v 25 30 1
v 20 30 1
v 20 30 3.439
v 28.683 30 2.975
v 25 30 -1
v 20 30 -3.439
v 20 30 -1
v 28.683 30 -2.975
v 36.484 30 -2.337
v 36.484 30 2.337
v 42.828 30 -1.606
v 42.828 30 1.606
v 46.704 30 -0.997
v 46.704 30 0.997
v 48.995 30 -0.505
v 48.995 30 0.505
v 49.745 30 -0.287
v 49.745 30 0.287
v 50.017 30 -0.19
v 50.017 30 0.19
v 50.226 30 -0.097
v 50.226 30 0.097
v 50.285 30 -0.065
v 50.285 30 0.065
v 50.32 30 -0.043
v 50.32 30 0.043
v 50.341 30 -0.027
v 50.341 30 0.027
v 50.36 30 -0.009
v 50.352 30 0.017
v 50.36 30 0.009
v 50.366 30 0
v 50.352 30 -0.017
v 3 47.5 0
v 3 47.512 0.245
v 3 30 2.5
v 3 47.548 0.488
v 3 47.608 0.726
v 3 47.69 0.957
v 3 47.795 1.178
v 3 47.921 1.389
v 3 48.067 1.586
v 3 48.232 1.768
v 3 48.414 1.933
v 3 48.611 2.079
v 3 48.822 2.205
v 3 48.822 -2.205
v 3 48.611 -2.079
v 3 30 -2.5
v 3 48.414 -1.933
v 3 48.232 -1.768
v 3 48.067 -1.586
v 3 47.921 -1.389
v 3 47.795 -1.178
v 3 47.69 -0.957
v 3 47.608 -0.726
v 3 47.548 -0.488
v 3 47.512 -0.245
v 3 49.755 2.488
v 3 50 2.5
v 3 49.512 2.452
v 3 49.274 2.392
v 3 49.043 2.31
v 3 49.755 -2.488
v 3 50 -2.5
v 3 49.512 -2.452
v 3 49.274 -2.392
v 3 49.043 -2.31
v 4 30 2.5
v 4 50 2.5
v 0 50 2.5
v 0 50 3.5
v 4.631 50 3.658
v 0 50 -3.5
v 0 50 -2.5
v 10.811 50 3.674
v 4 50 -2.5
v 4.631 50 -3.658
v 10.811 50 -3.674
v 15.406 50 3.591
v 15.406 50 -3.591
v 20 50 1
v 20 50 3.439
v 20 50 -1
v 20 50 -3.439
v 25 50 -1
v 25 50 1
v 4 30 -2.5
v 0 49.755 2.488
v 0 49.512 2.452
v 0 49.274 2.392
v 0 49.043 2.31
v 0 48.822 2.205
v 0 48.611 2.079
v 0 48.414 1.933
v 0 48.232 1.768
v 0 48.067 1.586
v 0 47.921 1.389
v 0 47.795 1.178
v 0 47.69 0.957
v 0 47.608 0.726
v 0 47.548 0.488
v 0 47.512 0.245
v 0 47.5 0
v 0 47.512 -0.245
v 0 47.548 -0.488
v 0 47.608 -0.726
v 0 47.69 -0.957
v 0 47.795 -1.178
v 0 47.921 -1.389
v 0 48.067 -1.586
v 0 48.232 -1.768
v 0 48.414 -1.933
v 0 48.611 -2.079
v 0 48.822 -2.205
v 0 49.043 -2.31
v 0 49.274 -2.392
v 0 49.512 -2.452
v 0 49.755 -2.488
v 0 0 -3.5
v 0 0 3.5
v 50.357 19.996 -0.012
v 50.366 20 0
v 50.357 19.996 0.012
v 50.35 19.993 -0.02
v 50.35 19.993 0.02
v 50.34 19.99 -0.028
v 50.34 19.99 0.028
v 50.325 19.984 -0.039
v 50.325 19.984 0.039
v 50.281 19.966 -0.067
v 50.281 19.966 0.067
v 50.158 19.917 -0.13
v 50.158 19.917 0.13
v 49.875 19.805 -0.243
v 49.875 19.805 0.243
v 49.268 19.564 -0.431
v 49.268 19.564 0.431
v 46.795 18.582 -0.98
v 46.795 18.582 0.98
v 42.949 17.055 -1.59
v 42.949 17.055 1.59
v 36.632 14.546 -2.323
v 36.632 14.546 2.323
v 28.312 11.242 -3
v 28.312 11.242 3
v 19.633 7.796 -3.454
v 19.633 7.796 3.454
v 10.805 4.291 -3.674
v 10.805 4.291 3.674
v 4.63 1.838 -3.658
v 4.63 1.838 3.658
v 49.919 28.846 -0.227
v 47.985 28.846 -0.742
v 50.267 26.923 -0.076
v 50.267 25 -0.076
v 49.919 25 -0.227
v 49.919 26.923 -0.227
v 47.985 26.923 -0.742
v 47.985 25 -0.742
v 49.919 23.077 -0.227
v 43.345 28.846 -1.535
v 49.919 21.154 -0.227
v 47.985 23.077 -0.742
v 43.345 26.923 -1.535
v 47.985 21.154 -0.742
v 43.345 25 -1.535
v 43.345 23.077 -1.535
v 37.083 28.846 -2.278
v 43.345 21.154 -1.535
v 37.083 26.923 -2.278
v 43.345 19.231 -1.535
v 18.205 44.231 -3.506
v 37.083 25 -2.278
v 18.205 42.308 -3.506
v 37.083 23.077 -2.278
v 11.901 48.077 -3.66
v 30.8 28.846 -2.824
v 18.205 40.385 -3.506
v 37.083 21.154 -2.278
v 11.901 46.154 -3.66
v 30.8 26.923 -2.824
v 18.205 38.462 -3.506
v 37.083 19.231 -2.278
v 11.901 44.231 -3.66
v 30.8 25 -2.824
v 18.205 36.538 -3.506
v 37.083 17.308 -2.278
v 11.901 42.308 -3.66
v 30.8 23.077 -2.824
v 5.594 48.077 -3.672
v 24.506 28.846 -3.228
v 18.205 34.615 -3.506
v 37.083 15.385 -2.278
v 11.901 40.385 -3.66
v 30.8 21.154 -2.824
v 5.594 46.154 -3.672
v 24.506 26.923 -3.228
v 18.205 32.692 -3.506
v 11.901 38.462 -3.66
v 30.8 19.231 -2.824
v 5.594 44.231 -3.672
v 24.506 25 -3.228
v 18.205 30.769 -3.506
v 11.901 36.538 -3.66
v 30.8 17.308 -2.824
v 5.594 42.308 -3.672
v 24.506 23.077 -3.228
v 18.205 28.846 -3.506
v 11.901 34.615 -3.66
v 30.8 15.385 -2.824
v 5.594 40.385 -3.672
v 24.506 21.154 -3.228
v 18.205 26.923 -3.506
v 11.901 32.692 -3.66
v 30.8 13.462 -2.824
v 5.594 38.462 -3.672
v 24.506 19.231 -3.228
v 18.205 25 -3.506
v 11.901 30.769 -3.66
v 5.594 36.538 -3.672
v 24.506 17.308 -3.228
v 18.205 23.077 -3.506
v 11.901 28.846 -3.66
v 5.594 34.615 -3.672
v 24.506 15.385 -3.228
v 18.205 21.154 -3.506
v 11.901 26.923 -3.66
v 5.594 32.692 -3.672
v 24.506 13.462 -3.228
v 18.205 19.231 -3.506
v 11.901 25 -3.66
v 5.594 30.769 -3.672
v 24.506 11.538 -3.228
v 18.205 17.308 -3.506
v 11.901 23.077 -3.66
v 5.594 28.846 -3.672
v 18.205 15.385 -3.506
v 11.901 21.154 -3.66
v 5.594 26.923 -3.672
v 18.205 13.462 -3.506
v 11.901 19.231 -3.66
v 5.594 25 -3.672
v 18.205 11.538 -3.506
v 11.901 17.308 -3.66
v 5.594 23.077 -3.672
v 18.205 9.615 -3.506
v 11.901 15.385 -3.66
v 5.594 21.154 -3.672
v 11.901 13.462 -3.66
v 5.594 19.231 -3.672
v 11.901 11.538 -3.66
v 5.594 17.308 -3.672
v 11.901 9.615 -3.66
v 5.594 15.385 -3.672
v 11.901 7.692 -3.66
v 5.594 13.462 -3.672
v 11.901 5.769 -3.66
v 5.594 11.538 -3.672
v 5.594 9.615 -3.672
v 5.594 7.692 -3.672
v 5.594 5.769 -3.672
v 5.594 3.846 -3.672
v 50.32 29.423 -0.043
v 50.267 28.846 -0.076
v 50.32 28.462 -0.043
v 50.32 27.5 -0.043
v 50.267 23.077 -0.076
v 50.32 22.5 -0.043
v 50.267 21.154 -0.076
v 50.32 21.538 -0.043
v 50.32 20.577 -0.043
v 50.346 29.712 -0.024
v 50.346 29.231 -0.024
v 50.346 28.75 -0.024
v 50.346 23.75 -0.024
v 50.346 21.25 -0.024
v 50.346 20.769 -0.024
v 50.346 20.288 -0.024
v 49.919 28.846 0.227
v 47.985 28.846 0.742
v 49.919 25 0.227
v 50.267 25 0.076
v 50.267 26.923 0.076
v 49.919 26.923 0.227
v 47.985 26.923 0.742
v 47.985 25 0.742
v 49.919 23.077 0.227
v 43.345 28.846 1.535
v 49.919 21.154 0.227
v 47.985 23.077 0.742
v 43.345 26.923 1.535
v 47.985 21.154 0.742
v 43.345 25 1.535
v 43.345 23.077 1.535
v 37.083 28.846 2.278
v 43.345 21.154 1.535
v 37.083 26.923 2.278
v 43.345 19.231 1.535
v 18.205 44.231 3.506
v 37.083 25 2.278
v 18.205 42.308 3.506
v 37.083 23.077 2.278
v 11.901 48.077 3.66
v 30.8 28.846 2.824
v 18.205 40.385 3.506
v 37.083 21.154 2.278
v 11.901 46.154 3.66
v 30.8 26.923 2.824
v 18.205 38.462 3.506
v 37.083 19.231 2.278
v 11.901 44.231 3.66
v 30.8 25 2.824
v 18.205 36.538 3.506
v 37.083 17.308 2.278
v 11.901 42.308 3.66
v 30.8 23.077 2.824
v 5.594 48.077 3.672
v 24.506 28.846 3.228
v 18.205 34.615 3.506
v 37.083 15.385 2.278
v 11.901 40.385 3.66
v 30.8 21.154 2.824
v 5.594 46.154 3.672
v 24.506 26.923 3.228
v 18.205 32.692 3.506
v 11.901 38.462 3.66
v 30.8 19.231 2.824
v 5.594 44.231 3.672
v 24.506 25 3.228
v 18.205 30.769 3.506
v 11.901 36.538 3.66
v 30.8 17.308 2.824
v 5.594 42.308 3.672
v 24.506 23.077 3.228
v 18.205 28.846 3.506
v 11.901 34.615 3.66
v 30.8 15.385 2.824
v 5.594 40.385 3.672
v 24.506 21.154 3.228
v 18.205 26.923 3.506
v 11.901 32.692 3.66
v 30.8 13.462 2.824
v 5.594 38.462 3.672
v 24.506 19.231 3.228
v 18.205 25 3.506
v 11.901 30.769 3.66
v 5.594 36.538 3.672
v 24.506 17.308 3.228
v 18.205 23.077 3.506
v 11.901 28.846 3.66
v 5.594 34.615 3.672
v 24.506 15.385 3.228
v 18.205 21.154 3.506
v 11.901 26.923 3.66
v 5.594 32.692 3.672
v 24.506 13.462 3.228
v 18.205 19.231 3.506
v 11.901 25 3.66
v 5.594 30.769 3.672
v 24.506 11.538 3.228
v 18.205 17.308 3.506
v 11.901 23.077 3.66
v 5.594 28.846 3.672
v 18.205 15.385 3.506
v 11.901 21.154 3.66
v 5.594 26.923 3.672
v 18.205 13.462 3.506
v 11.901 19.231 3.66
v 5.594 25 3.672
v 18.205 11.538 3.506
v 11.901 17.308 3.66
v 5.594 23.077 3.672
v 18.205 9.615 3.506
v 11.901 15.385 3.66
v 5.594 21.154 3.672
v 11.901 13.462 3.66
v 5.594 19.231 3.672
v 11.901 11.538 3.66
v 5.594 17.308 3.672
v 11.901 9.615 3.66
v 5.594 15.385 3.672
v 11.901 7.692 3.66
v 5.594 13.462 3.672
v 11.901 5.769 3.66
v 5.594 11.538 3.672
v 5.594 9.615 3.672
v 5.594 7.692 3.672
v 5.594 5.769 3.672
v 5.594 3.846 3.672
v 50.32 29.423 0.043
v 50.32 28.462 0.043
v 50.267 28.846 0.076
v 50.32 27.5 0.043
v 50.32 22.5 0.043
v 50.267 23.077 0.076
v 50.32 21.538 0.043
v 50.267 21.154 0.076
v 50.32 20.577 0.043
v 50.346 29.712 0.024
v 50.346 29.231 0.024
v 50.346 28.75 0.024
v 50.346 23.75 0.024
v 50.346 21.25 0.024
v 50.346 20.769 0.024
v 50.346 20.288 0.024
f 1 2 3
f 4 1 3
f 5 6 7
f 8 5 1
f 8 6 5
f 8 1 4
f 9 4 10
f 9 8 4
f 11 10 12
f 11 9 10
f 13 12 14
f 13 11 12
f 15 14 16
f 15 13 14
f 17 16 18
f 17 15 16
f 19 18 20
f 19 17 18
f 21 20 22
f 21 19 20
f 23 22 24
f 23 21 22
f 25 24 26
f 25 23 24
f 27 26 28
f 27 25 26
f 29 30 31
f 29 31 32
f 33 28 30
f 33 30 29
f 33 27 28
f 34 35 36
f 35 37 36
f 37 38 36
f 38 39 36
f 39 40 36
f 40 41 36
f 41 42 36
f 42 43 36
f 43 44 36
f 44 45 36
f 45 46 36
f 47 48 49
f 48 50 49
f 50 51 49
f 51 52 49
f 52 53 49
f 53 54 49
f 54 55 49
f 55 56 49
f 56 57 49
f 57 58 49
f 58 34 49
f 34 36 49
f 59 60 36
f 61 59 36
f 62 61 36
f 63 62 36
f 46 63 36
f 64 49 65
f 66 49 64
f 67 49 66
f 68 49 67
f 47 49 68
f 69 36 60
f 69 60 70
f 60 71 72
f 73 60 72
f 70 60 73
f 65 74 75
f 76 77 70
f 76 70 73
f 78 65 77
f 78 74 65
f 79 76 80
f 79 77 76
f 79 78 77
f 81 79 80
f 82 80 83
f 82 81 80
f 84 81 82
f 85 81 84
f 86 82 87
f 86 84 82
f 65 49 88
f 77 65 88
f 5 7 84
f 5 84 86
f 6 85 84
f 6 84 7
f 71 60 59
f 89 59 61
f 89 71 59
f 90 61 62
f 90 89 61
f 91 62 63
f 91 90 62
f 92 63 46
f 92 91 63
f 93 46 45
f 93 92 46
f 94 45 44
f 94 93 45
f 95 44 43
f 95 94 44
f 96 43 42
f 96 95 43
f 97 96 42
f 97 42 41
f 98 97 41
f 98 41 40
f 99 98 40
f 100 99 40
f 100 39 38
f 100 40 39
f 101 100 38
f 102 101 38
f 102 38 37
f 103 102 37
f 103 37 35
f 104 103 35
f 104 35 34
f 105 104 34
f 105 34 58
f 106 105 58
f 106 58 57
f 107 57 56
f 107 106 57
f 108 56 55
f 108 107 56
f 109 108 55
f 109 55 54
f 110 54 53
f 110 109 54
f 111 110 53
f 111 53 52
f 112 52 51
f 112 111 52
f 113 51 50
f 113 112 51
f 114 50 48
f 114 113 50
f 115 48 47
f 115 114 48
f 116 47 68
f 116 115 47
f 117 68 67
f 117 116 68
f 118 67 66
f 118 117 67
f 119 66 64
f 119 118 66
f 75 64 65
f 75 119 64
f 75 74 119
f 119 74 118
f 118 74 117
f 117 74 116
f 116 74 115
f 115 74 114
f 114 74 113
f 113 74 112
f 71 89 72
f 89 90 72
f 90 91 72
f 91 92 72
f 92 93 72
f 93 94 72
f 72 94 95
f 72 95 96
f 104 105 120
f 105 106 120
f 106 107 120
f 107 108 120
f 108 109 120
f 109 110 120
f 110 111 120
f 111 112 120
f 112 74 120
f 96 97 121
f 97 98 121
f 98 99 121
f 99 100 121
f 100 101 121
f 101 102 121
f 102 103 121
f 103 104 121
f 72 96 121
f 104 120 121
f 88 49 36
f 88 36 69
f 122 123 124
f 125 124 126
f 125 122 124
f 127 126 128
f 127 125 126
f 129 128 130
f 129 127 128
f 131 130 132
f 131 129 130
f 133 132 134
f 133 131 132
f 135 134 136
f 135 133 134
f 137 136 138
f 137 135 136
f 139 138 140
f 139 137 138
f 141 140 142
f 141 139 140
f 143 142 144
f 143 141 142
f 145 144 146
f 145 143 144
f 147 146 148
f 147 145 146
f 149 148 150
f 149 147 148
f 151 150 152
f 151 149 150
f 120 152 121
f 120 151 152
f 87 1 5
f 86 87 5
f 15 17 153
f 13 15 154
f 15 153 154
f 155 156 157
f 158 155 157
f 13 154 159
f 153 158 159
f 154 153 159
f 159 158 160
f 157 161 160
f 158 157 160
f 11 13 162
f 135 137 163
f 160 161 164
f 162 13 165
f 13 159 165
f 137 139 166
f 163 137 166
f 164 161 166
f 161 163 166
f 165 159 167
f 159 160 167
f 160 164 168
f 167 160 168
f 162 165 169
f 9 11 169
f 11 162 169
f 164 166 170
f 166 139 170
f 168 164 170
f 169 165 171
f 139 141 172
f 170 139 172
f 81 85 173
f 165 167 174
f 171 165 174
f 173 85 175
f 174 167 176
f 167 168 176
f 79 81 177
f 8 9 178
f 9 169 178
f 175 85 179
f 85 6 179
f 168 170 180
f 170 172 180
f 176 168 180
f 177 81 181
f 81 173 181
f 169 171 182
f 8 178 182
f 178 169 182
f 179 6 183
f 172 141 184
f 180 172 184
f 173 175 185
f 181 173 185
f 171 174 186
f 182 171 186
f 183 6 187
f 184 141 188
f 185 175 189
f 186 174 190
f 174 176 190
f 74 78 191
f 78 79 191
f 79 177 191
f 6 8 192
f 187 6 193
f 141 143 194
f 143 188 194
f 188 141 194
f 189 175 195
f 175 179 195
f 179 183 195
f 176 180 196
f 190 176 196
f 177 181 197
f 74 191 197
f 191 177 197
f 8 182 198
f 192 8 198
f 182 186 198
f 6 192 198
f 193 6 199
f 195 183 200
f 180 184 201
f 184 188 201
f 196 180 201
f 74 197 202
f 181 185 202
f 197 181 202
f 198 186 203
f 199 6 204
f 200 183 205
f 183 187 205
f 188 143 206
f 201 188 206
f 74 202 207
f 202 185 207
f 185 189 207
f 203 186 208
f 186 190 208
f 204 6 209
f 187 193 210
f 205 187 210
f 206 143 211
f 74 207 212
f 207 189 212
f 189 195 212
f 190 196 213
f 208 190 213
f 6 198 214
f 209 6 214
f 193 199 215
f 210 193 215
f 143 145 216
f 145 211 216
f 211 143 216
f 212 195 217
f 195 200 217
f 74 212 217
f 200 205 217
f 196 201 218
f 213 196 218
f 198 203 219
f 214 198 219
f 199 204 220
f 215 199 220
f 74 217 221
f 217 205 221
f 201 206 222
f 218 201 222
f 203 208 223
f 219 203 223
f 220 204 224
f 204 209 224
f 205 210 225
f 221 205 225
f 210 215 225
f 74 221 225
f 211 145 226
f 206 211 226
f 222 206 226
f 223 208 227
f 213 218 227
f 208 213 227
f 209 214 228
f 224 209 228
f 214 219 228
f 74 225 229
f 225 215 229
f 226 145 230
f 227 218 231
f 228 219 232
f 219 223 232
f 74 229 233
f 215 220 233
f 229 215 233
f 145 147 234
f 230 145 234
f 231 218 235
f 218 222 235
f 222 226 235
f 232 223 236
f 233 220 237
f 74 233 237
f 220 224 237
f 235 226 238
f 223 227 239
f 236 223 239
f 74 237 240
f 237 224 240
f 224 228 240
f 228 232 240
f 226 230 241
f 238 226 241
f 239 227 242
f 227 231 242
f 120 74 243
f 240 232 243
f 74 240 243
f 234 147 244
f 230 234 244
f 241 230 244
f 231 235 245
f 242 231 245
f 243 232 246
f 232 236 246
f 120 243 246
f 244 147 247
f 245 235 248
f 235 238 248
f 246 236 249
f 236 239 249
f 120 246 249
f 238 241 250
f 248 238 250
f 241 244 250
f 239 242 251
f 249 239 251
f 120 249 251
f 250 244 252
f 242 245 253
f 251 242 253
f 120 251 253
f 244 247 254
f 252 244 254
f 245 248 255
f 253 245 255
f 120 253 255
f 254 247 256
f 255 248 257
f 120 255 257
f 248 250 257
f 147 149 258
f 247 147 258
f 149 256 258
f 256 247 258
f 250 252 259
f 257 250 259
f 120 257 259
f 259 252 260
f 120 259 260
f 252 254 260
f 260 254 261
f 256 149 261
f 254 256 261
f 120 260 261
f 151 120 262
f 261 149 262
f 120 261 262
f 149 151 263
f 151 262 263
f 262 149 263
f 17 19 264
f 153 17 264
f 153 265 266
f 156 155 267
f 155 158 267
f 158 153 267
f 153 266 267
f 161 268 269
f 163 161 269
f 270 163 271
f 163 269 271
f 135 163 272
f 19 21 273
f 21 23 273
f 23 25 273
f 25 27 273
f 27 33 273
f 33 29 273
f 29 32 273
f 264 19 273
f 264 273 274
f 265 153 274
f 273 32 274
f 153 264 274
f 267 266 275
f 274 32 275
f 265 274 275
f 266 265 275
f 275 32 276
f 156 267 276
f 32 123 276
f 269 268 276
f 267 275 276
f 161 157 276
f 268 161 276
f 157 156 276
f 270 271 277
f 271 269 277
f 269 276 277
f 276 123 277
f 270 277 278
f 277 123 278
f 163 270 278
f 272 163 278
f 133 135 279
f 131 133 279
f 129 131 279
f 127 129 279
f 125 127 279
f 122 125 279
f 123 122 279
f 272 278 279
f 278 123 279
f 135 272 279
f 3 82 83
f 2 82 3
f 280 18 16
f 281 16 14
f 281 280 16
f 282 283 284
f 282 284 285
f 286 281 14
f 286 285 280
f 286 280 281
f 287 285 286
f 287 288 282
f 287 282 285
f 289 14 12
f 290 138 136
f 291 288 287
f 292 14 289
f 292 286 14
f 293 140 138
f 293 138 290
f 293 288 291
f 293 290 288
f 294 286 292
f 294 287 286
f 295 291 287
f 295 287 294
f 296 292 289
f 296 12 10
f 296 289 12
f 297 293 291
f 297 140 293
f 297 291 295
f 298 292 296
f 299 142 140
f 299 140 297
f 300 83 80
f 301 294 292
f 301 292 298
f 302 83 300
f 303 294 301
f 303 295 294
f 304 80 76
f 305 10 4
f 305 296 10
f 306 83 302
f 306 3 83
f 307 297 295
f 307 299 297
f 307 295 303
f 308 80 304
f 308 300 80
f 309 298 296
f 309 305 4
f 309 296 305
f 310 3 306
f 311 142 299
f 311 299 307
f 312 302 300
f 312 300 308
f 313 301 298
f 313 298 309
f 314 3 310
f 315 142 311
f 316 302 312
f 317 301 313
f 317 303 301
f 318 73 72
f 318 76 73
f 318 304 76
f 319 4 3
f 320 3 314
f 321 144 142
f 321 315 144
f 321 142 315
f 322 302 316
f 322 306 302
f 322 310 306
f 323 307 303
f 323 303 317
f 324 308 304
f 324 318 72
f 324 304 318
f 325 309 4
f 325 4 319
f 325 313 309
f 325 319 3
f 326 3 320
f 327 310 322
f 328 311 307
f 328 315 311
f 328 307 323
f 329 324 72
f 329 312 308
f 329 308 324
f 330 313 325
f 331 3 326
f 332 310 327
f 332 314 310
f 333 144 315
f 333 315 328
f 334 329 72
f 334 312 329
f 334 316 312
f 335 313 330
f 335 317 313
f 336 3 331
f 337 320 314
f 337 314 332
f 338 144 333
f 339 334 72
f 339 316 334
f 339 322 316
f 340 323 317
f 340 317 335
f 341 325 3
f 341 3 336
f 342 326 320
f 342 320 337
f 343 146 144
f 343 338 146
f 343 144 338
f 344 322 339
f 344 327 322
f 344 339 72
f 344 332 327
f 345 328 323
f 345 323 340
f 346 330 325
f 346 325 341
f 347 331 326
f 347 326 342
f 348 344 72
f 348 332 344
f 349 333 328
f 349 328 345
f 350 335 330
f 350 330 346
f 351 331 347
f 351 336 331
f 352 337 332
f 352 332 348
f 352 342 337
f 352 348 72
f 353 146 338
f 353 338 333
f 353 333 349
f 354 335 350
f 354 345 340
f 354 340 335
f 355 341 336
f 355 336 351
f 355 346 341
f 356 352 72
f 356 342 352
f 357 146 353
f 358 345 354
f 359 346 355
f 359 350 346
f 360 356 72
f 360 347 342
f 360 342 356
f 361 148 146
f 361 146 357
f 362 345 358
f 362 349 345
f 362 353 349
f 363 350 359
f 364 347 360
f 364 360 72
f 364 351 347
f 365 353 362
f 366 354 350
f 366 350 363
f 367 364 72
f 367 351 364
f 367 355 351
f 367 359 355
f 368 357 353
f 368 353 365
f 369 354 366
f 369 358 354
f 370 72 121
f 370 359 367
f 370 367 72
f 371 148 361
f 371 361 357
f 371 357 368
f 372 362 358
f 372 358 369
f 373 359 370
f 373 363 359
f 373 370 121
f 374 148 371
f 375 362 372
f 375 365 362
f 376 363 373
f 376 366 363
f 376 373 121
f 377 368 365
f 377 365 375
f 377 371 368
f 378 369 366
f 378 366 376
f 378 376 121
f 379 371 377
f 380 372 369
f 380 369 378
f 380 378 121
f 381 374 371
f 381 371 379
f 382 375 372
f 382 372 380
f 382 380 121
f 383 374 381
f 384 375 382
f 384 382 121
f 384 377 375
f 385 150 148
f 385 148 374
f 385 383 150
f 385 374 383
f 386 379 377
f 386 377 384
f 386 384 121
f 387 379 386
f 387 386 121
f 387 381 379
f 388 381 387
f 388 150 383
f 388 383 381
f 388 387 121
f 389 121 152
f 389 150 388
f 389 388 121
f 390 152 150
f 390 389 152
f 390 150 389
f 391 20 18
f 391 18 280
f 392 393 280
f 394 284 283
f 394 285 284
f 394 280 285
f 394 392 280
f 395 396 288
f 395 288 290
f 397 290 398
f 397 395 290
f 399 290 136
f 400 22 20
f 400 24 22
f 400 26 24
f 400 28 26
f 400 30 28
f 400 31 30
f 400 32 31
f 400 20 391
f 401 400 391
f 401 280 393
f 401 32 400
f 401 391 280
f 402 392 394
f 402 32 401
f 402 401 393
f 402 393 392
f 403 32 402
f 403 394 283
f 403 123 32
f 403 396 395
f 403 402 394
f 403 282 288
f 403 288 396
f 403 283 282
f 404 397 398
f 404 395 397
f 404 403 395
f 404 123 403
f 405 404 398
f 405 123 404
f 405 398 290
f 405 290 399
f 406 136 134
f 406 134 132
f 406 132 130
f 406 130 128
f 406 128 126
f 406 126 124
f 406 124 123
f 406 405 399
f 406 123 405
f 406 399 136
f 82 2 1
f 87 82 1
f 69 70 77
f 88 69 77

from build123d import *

# Parameters (mm, degrees)
EXTRUDE_2_DEPTH          = 100
CUT_EXTRUDE_1_DEPTH      = 100
CUT_EXTRUDE_1_DEPTH_BACK = 100
CUT_EXTRUDE_2_DEPTH      = 10
CUT_EXTRUDE_2_DEPTH_BACK = 10
SKETCH_8_R               = 2.5
CUT_EXTRUDE_3_DEPTH      = 4
CUT_EXTRUDE_START        = 30
SKETCH_9_W               = 1
SKETCH_9_H               = 5
CUT_EXTRUDE_4_DEPTH      = 20
EXTRUDE_START            = 30
SKETCH_11_W              = 5
SKETCH_11_H              = 2
EXTRUDE_4_DEPTH          = 20


with BuildPart() as part:
    # 草图1 → 凸台-拉伸2 (new body)
    with BuildSketch(Plane(origin=(0, 0, 0), x_dir=(1, 0, 0), z_dir=(0, 1, 0))):
        with BuildLine():
            Line((0, 3.5), (0, -3.5))
            add(Edge.make_bspline(
                [(50.366159274, 0), (50.361611856, -0.007626809), (50.351204479, -0.02006437), (50.331882619, -0.034590016), (50.303550644, -0.054206105), (50.267550201, -0.075556608), (50.212502865, -0.10497516), (50.119653298, -0.148566943), (49.957819519, -0.214752734), (49.665215675, -0.317523283), (49.13925125, -0.473472151), (48.270224034, -0.688745908), (46.70823084, -1.011640024), (44.506574683, -1.380432353), (41.778946661, -1.759931683), (38.652126132, -2.124759538), (35.514265565, -2.438710467), (32.372435692, -2.710036408), (29.227679081, -2.944564854), (26.08060135, -3.145565261), (22.931686571, -3.315201685), (19.781279338, -3.454355095), (16.629676417, -3.563265326), (13.477153227, -3.64092263), (10.32396772, -3.685707952), (7.170479651, -3.693560136), (4.194558842, -3.660897819), (2.007697821, -3.59990808), (0.60968903, -3.538531774), (0, -3.5)],
                knots=[0, 0, 0, 0, 0, 0.00069899, 0.001287975, 0.00188024, 0.002733393, 0.003996075, 0.006218737, 0.009974212, 0.016536224, 0.028474968, 0.049524397, 0.080651233, 0.142462147, 0.204715828, 0.26696952, 0.329223211, 0.391476901, 0.453730594, 0.515984286, 0.578237977, 0.640491669, 0.70274536, 0.764999052, 0.827252742, 0.889506435, 0.951760127, 1, 1, 1, 1, 1], degree=4))
            add(Edge.make_bspline(
                [(50.366159274, 0), (50.361611856, 0.007626809), (50.351204479, 0.02006437), (50.331882619, 0.034590016), (50.303550644, 0.054206105), (50.267550201, 0.075556608), (50.212502865, 0.10497516), (50.119653298, 0.148566943), (49.957819519, 0.214752734), (49.665215675, 0.317523283), (49.13925125, 0.473472151), (48.270224034, 0.688745908), (46.70823084, 1.011640024), (44.506574683, 1.380432353), (41.778946661, 1.759931683), (38.652126132, 2.124759538), (35.514265565, 2.438710467), (32.372435692, 2.710036408), (29.227679081, 2.944564854), (26.08060135, 3.145565261), (22.931686571, 3.315201685), (19.781279338, 3.454355095), (16.629676417, 3.563265326), (13.477153227, 3.64092263), (10.32396772, 3.685707952), (7.170479651, 3.693560136), (4.194558842, 3.660897819), (2.007697821, 3.59990808), (0.60968903, 3.538531774), (0, 3.5)],
                knots=[0, 0, 0, 0, 0, 0.00069899, 0.001287975, 0.00188024, 0.002733393, 0.003996075, 0.006218737, 0.009974212, 0.016536224, 0.028474968, 0.049524397, 0.080651233, 0.142462147, 0.204715828, 0.26696952, 0.329223211, 0.391476901, 0.453730594, 0.515984286, 0.578237977, 0.640491669, 0.70274536, 0.764999052, 0.827252742, 0.889506435, 0.951760127, 1, 1, 1, 1, 1], degree=4))
        make_face()
    extrude(amount=EXTRUDE_2_DEPTH)

    # 草图3 → 切除-拉伸1 (cut, two sides: drawn at the far end of the back side and taken through both)
    with BuildSketch(Plane.XY.offset(-CUT_EXTRUDE_1_DEPTH_BACK)):
        Polygon((50.366159274, 100), (50.366159274, 80), (0, 100), align=None)
        Polygon((50.366159274, 0), (50.366159274, 20), (0, 0), align=None)
    extrude(amount=CUT_EXTRUDE_1_DEPTH + CUT_EXTRUDE_1_DEPTH_BACK, mode=Mode.SUBTRACT)

    # 草图7 → 切除-拉伸2 (cut, two sides: drawn at the far end of the back side and taken through both)
    with BuildSketch(Plane.XY.offset(-CUT_EXTRUDE_2_DEPTH_BACK)):
        Polygon((0, 50), (20, 50), (20, 30), (50.366159274, 30), (50.366159274, 80), (0, 100), align=None)
    extrude(amount=CUT_EXTRUDE_2_DEPTH + CUT_EXTRUDE_2_DEPTH_BACK, mode=Mode.SUBTRACT)

    # 草图8 → 切除-拉伸3 (cut)
    with BuildSketch(Plane(origin=(0, 0, 0), x_dir=(0, 0, -1), z_dir=(1, 0, 0))):
        with Locations((0, 50)):
            Circle(SKETCH_8_R)
    extrude(amount=CUT_EXTRUDE_3_DEPTH, mode=Mode.SUBTRACT)

    # 草图9 → 切除-拉伸4 (cut)
    with BuildSketch(Plane(origin=(0, 0, 0), x_dir=(1, 0, 0), z_dir=(0, 1, 0)).offset(CUT_EXTRUDE_START)):
        with Locations((3.5, 0)):
            Rectangle(SKETCH_9_W, SKETCH_9_H)
    extrude(amount=CUT_EXTRUDE_4_DEPTH, mode=Mode.SUBTRACT)

    # 草图11 → 凸台-拉伸4 (add)
    with BuildSketch(Plane(origin=(0, 0, 0), x_dir=(1, 0, 0), z_dir=(0, 1, 0)).offset(EXTRUDE_START)):
        with Locations((22.5, 0)):
            Rectangle(SKETCH_11_W, SKETCH_11_H)
    extrude(amount=EXTRUDE_4_DEPTH)


solid = part.part
